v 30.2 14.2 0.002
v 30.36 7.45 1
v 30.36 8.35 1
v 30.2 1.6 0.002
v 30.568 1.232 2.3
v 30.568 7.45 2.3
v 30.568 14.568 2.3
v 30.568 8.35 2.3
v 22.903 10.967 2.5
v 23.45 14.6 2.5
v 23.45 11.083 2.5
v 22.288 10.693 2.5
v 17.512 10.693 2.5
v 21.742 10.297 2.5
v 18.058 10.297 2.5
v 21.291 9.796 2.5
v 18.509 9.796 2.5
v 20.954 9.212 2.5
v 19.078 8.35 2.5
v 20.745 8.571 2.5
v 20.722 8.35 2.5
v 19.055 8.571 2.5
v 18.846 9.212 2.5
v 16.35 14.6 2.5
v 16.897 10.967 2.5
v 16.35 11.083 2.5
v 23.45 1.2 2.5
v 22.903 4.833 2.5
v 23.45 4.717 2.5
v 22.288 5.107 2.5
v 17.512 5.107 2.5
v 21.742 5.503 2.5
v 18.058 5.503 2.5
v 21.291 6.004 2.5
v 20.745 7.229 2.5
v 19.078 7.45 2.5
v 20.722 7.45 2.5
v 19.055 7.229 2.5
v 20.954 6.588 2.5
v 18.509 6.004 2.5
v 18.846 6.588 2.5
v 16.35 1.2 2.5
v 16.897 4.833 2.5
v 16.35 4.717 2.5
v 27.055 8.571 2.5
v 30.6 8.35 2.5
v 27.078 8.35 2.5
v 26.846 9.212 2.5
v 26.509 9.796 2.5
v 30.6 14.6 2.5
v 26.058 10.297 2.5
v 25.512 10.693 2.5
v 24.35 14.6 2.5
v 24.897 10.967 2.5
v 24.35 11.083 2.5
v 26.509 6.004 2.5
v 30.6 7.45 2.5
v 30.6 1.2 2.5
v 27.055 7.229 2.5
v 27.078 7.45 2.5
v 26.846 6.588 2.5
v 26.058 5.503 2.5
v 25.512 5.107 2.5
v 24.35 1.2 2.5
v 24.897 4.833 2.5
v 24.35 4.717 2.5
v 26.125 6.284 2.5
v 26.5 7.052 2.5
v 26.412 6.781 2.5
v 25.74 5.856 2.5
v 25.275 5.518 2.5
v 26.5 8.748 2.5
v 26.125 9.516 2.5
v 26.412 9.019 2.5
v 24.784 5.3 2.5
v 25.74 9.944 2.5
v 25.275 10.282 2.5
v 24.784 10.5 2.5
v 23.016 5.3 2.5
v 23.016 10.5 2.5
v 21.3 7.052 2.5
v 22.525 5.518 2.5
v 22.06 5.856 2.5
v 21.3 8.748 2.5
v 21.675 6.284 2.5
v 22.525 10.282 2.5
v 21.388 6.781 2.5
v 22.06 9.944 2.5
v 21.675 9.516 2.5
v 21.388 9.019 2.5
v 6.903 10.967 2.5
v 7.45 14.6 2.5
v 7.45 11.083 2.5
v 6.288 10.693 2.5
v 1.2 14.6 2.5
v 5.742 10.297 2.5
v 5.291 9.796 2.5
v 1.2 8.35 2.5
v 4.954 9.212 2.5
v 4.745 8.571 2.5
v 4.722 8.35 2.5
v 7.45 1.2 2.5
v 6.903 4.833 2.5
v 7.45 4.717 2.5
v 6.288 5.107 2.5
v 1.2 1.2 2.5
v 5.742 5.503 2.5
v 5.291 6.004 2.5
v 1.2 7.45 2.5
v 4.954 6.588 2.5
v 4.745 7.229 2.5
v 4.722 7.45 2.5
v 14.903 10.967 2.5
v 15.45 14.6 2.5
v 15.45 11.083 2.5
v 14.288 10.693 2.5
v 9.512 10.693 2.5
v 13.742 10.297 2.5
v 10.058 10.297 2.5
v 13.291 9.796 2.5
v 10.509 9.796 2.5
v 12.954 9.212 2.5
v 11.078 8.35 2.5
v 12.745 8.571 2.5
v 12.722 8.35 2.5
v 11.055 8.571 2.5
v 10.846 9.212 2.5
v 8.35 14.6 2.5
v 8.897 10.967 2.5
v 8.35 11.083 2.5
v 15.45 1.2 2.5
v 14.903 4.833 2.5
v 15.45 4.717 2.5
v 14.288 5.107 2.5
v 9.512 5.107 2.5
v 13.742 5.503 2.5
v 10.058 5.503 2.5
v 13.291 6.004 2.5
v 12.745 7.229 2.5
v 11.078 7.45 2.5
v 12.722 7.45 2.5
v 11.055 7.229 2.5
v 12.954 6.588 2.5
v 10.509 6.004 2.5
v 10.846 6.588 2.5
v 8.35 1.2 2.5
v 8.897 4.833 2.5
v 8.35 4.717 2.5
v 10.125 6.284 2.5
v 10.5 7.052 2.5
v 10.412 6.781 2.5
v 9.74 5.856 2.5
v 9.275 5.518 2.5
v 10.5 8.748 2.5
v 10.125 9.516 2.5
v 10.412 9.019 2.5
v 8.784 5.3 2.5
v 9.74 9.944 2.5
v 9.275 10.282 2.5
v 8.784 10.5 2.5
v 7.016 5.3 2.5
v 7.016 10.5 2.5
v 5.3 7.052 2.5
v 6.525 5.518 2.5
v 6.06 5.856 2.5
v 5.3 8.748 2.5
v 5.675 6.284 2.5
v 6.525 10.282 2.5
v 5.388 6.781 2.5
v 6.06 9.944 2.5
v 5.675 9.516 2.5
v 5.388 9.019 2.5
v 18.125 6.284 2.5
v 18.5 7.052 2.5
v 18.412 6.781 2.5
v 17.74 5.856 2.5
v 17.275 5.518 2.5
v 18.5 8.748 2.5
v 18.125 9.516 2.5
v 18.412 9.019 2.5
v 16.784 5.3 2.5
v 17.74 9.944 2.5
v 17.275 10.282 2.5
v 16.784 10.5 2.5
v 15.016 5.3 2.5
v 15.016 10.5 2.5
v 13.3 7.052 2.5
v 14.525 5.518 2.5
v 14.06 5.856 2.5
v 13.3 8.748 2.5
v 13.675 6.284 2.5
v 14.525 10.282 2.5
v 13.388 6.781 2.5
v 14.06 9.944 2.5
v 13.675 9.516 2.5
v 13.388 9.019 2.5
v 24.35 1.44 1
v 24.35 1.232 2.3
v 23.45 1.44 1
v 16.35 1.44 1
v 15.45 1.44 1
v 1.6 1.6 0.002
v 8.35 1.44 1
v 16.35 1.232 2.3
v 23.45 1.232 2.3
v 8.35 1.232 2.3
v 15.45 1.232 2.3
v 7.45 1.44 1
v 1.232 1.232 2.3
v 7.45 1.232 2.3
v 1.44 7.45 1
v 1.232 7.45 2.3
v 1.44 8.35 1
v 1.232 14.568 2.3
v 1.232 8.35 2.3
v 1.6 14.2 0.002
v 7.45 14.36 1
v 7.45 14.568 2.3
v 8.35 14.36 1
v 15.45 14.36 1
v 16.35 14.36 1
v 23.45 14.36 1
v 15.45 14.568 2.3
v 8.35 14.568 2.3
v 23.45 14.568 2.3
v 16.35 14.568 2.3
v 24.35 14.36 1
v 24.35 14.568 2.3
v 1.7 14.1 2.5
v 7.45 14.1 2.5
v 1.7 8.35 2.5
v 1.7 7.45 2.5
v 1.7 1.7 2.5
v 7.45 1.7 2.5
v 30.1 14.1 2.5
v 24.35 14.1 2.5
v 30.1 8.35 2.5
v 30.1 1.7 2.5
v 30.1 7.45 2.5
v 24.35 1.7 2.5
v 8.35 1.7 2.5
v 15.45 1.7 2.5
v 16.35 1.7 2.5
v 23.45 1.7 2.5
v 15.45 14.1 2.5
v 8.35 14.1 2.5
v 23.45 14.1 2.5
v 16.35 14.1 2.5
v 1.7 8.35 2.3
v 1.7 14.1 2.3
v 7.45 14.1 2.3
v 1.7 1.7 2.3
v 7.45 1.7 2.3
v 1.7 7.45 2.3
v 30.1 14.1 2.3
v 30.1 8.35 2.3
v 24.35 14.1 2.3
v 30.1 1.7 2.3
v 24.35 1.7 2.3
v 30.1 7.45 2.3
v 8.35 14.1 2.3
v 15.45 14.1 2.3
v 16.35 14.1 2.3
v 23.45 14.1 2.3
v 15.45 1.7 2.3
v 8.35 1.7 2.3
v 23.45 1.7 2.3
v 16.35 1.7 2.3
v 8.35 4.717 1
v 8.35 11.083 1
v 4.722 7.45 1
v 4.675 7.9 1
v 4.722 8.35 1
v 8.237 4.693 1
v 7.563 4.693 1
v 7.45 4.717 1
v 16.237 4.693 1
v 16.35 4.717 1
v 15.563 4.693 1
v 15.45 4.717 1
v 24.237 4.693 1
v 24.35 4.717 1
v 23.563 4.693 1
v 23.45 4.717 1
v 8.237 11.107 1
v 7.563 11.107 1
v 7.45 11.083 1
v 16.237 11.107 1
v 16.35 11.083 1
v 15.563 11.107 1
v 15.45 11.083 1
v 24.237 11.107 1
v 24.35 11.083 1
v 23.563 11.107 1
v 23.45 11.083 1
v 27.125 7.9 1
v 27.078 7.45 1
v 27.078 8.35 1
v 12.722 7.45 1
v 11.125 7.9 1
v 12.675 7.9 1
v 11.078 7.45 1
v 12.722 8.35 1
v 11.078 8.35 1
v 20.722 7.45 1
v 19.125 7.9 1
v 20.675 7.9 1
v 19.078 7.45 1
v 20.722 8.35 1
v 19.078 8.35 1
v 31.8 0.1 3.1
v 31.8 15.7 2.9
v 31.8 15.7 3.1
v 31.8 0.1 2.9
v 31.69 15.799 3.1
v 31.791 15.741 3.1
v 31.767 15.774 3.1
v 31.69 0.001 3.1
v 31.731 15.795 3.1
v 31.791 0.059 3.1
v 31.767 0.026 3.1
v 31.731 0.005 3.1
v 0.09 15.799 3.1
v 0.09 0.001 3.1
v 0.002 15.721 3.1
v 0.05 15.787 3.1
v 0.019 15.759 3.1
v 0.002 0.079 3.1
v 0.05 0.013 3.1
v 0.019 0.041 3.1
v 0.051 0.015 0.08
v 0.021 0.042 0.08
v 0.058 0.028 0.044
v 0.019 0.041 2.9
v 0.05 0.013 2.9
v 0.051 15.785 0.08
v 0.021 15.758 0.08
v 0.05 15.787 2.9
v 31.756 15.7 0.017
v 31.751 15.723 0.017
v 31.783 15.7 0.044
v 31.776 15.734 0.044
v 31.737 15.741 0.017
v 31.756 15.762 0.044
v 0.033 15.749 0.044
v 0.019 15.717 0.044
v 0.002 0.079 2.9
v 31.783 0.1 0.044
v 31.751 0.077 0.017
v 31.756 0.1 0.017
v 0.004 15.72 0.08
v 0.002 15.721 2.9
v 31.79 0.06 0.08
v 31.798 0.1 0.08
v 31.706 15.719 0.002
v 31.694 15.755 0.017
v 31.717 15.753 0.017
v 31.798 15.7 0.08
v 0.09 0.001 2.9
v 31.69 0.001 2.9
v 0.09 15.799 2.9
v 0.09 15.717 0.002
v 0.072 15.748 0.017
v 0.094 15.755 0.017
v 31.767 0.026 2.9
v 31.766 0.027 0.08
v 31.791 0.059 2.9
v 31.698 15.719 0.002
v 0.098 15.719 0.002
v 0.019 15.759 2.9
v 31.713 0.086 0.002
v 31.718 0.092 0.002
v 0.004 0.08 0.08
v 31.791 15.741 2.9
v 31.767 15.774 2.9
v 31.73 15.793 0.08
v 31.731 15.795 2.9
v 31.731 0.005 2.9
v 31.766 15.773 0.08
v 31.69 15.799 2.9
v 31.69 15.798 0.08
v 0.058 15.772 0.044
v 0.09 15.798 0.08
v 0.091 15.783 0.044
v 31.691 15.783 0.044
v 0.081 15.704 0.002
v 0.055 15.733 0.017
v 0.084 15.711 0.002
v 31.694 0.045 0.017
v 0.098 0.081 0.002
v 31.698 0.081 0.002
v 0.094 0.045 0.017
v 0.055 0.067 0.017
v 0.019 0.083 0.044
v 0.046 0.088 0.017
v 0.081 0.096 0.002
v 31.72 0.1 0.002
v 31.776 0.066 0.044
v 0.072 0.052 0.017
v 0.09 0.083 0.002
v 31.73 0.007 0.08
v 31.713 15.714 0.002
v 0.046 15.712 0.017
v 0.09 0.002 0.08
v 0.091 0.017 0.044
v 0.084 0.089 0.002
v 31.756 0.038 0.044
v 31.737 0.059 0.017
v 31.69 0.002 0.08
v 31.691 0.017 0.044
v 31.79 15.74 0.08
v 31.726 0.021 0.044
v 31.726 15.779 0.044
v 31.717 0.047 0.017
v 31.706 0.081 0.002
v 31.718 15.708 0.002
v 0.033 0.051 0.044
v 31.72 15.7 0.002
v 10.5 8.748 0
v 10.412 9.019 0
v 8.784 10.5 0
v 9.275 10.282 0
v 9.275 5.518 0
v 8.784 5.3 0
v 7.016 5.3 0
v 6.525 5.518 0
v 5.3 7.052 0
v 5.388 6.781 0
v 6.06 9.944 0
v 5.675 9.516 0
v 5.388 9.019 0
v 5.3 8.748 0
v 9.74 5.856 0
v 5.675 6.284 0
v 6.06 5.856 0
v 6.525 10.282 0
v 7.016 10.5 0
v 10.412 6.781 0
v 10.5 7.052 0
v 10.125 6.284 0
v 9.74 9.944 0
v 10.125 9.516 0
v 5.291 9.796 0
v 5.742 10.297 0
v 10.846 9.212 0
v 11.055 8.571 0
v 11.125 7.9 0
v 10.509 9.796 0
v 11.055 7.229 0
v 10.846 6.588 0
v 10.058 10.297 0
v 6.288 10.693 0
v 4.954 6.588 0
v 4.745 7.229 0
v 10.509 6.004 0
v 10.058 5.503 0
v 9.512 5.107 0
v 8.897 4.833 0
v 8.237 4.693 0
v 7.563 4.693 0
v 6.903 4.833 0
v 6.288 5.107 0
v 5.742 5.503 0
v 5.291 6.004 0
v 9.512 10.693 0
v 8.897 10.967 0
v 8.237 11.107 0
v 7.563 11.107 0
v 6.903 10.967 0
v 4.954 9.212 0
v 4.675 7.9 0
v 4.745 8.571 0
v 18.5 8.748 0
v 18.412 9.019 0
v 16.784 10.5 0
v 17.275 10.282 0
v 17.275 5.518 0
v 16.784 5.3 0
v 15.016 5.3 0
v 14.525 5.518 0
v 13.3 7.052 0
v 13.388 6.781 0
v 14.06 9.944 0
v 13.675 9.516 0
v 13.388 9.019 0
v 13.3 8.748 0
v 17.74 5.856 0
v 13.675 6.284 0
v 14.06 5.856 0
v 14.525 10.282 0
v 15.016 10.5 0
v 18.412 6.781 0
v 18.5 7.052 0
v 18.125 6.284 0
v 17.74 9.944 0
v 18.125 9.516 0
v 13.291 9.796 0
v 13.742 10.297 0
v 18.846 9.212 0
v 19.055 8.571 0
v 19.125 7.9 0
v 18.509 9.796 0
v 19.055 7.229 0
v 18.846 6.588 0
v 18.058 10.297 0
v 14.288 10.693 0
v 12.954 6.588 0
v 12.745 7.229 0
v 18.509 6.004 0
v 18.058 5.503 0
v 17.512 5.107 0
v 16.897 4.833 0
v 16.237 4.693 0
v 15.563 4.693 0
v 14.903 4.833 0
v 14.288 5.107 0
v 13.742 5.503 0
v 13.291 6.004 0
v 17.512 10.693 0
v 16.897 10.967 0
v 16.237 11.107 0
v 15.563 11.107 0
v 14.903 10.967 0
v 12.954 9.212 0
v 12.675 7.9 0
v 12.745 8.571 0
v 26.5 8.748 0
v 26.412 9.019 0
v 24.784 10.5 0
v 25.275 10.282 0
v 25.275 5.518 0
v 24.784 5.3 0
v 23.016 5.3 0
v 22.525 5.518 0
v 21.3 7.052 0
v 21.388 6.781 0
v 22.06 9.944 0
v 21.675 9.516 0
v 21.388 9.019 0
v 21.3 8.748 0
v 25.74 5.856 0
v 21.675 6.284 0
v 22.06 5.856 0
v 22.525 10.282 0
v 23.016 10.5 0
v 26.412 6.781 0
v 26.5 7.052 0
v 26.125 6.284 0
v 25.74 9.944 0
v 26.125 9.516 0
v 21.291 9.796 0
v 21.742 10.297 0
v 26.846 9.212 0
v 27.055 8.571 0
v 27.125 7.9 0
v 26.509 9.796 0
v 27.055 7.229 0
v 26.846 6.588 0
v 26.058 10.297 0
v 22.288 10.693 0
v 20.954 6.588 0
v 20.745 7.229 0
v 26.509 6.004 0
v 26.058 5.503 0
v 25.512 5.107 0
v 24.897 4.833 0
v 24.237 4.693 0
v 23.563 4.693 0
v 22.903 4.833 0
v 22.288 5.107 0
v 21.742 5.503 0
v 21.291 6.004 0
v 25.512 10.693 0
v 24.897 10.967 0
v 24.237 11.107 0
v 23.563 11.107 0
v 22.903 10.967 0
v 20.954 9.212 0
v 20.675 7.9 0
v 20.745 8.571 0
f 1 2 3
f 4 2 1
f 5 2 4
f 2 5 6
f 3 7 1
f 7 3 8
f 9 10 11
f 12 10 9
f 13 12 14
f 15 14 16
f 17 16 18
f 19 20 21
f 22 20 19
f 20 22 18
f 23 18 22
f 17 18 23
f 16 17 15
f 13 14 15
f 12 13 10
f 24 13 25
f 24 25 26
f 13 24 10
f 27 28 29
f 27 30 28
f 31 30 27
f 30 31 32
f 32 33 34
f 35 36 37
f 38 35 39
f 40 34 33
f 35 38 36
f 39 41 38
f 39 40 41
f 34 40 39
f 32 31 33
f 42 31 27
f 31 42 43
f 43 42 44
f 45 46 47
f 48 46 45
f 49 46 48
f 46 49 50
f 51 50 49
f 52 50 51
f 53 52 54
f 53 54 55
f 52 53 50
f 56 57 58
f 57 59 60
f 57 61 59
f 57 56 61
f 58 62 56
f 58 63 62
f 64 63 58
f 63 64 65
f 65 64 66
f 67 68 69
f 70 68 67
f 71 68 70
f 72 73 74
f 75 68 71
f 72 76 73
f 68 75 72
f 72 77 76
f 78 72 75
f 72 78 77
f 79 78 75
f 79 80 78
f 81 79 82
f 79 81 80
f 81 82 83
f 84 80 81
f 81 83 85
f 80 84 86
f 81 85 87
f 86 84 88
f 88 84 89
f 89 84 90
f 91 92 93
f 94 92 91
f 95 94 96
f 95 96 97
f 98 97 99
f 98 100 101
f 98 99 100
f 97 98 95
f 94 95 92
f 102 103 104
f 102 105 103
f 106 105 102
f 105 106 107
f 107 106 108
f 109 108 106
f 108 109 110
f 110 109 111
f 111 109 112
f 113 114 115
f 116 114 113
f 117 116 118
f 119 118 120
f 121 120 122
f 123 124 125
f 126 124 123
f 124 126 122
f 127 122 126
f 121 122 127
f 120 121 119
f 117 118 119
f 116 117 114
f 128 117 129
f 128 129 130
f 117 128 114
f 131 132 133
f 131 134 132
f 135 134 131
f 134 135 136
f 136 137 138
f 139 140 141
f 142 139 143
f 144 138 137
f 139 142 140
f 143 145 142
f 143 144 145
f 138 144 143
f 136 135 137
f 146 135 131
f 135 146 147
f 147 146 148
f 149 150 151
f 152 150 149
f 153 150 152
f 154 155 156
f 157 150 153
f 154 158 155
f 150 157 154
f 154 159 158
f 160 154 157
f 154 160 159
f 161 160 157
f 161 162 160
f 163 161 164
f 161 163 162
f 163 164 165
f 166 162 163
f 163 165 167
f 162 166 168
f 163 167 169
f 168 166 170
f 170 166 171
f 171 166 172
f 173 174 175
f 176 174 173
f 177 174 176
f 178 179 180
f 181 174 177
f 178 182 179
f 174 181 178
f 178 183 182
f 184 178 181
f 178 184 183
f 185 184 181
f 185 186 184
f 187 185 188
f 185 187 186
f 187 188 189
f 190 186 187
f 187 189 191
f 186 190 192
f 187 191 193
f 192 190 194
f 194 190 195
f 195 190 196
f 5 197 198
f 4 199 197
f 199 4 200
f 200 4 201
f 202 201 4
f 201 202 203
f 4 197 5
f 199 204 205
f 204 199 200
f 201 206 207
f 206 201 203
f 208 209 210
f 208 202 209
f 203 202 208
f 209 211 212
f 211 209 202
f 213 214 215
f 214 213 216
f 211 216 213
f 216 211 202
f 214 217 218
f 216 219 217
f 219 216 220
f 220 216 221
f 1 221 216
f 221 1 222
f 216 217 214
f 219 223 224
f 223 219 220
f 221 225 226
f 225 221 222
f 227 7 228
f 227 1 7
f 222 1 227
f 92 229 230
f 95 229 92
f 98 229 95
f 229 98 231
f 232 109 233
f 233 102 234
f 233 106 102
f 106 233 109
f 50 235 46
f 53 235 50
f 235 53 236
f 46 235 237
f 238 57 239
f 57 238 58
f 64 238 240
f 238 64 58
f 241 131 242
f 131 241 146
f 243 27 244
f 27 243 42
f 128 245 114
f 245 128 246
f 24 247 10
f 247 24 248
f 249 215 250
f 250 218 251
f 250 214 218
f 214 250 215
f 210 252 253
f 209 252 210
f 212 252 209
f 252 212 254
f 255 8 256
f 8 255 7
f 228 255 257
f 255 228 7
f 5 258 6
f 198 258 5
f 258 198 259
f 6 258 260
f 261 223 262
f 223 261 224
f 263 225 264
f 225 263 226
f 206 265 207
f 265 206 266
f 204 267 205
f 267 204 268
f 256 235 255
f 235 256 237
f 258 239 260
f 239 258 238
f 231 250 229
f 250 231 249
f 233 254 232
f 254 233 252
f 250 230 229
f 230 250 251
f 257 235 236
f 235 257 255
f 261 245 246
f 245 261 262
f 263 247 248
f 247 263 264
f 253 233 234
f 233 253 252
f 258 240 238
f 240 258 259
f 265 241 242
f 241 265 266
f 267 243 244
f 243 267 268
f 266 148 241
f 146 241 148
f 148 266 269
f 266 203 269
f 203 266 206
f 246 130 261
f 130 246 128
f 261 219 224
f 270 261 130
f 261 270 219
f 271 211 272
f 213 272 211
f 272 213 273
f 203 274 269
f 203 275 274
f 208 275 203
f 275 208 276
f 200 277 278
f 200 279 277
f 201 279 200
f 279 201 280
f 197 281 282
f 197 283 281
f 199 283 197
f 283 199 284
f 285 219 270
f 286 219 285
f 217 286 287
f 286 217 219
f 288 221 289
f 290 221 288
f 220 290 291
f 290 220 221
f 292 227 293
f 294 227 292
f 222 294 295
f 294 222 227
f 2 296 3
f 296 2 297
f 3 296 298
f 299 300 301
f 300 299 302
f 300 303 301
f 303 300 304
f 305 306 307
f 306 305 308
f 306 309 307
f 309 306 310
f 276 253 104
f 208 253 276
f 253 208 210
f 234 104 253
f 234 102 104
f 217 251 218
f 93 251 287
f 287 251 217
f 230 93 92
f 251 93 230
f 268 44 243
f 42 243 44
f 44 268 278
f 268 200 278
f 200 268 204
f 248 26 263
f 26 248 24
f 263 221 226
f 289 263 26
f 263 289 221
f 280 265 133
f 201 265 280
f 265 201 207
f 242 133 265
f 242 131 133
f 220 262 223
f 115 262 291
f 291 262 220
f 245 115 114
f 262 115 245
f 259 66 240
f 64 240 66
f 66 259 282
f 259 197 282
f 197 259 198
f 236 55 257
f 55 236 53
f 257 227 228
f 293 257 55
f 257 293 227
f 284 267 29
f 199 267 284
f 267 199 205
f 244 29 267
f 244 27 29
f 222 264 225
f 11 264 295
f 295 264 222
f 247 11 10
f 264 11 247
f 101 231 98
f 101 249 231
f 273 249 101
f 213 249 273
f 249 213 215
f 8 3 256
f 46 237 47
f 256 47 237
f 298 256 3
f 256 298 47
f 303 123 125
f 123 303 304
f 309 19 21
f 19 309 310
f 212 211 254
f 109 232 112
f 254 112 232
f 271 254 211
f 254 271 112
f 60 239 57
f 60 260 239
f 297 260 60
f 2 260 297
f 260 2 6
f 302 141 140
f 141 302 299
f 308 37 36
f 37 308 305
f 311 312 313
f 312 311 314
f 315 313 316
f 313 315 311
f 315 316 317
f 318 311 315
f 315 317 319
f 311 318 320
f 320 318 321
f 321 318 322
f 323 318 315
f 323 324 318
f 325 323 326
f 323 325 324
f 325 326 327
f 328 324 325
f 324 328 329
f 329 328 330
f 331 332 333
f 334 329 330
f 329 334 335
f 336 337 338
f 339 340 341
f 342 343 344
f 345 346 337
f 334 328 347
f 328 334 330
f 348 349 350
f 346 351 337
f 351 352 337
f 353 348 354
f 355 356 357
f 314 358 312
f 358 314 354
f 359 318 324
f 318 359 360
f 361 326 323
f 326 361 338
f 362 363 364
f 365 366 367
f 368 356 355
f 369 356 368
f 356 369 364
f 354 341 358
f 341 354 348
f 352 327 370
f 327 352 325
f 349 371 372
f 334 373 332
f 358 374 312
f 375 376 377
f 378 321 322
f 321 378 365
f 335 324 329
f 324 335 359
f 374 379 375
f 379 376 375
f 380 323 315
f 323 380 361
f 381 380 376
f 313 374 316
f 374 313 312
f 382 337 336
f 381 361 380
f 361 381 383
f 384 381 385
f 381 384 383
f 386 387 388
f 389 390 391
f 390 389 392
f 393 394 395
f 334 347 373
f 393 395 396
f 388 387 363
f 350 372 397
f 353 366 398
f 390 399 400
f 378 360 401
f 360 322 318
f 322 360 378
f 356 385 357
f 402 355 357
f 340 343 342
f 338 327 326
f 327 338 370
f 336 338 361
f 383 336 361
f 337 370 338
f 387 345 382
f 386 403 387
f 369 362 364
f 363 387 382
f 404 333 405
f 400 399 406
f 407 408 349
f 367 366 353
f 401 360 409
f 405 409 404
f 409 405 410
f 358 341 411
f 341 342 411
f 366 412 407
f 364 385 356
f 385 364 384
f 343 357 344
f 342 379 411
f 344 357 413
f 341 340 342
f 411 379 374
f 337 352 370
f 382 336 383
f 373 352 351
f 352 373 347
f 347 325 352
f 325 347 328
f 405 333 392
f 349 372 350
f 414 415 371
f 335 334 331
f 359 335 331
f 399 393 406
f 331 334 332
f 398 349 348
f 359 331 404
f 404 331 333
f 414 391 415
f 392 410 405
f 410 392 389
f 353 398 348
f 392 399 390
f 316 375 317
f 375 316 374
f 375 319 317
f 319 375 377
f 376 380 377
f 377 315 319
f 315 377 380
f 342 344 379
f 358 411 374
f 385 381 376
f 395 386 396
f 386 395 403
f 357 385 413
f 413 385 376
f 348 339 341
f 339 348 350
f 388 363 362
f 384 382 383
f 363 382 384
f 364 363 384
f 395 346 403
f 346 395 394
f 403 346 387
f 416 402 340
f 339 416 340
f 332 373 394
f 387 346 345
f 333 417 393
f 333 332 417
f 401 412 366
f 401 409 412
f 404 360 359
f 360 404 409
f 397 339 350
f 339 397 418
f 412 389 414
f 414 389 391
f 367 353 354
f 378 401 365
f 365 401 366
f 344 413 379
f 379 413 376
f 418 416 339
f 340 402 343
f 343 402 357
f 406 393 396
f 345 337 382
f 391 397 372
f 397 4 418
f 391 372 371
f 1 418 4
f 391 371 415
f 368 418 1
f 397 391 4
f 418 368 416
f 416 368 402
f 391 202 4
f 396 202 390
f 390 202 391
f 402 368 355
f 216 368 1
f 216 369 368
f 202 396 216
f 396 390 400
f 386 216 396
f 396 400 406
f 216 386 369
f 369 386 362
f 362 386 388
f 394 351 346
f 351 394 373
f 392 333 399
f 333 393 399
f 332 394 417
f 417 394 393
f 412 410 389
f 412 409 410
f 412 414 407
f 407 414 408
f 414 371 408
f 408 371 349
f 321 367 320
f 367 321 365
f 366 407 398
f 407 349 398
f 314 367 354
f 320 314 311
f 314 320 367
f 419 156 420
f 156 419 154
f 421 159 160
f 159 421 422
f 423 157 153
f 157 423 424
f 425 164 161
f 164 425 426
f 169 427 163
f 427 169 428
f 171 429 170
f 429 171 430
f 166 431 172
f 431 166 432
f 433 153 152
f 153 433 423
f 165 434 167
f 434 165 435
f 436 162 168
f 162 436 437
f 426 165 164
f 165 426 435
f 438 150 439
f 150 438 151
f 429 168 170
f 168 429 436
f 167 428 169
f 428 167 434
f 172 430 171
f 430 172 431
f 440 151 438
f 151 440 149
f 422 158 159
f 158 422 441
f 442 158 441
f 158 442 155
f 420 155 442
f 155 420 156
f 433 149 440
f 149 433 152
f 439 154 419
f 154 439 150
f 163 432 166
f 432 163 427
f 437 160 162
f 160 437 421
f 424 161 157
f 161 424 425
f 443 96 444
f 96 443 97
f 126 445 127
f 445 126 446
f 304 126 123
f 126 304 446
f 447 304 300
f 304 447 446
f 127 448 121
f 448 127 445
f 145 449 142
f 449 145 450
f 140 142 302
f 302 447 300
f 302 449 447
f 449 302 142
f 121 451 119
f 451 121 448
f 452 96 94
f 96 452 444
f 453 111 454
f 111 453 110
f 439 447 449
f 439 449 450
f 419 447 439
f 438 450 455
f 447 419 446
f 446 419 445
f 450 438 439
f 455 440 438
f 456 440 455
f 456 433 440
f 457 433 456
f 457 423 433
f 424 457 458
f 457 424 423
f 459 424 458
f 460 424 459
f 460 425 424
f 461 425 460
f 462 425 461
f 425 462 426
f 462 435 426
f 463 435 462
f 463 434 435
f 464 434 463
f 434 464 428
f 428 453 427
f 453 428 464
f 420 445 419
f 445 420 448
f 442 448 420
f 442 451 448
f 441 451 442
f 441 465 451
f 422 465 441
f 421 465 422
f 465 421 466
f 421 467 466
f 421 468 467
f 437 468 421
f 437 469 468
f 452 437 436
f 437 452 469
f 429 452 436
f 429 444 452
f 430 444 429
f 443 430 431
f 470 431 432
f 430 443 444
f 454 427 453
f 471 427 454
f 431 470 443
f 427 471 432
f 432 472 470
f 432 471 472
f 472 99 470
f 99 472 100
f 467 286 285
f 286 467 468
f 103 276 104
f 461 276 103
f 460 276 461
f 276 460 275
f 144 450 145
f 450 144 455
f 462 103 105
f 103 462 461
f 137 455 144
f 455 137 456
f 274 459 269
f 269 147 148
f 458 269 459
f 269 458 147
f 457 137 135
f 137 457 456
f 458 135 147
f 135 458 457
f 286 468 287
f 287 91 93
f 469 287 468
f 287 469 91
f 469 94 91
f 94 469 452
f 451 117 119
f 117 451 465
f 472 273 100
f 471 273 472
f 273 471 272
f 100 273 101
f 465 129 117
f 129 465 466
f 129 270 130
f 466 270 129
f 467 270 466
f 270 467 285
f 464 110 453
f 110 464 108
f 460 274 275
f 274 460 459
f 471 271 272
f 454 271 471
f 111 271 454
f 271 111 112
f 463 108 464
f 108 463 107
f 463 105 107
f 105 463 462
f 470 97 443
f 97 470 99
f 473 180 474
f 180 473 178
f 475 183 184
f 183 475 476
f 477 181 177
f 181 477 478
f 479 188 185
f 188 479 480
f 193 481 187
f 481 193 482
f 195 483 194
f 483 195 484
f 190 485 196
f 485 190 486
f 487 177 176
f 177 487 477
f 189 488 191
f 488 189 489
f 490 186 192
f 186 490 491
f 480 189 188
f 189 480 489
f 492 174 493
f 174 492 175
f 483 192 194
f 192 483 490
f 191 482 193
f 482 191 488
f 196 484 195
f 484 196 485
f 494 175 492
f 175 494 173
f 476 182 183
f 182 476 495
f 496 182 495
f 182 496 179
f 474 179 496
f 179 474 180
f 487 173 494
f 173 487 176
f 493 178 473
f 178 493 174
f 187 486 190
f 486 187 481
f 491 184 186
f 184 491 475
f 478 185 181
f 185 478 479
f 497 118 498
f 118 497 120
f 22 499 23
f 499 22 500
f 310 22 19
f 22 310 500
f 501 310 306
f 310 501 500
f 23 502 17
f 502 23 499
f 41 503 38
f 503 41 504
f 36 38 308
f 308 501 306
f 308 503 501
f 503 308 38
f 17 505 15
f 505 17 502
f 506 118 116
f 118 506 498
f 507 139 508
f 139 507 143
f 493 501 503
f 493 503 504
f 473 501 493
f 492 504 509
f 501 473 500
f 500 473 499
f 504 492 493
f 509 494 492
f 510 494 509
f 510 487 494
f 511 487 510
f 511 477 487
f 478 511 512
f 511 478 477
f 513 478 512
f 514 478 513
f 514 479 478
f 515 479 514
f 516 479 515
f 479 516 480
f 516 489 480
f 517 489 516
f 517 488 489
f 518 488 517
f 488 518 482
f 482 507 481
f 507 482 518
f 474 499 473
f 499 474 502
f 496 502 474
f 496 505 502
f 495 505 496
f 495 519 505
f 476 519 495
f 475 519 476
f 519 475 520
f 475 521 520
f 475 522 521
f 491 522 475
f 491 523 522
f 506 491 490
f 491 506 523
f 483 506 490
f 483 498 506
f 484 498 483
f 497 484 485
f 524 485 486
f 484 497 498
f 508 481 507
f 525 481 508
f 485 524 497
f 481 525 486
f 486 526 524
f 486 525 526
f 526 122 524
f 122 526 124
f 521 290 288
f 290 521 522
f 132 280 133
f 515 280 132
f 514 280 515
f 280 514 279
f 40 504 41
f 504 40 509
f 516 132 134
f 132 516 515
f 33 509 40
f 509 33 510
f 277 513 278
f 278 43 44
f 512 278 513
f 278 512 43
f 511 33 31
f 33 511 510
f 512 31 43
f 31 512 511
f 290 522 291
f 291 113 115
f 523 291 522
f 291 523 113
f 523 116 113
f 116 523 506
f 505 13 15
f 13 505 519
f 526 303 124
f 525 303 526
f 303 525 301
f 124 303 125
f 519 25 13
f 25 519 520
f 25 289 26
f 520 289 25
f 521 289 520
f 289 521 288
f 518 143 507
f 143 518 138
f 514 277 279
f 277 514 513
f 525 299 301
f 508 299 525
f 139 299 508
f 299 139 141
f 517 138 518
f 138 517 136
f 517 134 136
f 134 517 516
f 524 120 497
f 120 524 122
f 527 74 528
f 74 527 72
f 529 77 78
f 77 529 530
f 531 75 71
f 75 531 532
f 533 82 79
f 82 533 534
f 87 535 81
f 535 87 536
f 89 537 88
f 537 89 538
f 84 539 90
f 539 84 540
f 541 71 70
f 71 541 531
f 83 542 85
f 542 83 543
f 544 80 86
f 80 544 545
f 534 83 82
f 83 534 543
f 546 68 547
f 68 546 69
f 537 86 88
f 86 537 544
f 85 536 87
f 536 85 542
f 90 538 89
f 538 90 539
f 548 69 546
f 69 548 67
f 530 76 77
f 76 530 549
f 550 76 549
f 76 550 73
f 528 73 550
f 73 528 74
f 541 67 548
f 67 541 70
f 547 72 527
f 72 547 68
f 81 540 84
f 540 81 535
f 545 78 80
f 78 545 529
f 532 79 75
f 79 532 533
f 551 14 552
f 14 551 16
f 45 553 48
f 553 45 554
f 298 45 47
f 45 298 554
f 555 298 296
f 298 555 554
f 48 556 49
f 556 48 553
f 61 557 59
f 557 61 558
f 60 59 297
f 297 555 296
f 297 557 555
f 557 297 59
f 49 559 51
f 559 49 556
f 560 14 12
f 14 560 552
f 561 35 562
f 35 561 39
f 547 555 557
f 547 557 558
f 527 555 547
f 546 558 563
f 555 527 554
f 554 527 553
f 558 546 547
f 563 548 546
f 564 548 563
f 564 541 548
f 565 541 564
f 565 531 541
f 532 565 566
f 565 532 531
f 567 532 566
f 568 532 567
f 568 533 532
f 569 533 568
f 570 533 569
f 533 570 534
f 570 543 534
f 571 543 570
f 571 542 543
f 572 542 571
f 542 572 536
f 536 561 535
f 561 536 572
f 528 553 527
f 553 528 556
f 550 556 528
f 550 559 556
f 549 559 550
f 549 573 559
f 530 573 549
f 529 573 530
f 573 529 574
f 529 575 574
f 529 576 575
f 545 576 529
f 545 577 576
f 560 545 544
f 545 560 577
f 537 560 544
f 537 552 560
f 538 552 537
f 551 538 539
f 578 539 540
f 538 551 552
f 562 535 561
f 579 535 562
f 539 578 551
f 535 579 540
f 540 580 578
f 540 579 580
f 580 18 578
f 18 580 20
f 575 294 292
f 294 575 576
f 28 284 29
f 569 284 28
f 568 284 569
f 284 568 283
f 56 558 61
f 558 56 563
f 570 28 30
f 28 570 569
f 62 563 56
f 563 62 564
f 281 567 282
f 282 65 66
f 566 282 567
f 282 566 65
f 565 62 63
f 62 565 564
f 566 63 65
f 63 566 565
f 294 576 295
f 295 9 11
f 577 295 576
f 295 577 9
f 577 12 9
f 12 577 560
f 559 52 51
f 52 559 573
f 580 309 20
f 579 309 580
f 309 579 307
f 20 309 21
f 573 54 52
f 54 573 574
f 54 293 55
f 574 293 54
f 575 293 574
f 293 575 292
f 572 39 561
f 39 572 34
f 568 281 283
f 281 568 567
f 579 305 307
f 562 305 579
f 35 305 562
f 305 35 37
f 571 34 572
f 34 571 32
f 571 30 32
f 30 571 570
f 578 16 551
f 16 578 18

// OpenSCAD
// file: ../../lib/brick-hollow.scad
/**
* Machine Blocks
* https://machinemania.net/blocks 
*
* Brick Hollow
* Copyright (c) 2022 Jan Philipp Knoeller <pk@pksoftware.de>
*
* Published under license:
* Creative Commons Attribution-NonCommercial-ShareAlike 4.0 International 
* https://creativecommons.org/licenses/by-nc-sa/4.0/
*
*/
echo(version=version());

module brickHollow(height=9.3, fade=2.5, minSize=[4.6,4.6], maxSize=[5.2, 5.2], center = false){
    echo(height, minSize, maxSize, fade);
    sizeX = max(minSize[0],maxSize[0]); 
   sizeY = max(minSize[1],maxSize[1]); 
    
    posX = center ? 0 : 0.5*sizeX; 
   posY = center ? 0 : 0.5*sizeY;   
   posZ = center ? -0.5 * (height-fade) : 0.5*fade;
    
    cutHelper = 0.2;
    overlapSpace=0.1;
    
    translate([posX, posY, posZ]){
        union(){
            polyhedron(points=[
                [-0.5*minSize[0],-0.5*minSize[1],-0.5*fade],
                [0.5*minSize[0],-0.5*minSize[1],-0.5*fade],
                [0.5*minSize[0],0.5*minSize[1],-0.5*fade],
                [-0.5*minSize[0],0.5*minSize[1],-0.5*fade],
                [-0.5*maxSize[0],-0.5*maxSize[1],0.5*fade],
                [0.5*maxSize[0],-0.5*maxSize[1],0.5*fade],
                [0.5*maxSize[0],0.5*maxSize[1],0.5*fade],
                [-0.5*maxSize[0],0.5*maxSize[1],0.5*fade]
            ], faces=[[0,1,2,3],[1,0,4,5],[2,1,5,6],[3,2,6,7],[0,3,7,4],[7,6,5,4]]);
            
            if(height > fade){
                translate([0,0,0.5*height - overlapSpace]){
                    cube([maxSize[0], maxSize[1], height - fade + overlapSpace], center=true);
                }
            }
            
            translate([0,0,-0.5*(fade + cutHelper) + overlapSpace]){
                cube([minSize[0], minSize[1], cutHelper + overlapSpace], center=true);
            }
        }
    }
}

//brickHollow(height=9.3, maxSize=[5.2,5.2], minSize=[4.6,4.6], center=true);
// file: ../../lib/roundedcube_simple.scad
/**
* Machine Blocks
* https://machinemania.net/blocks 
*
* Module for simple rounded cubes
* Copyright (c) 2022 Jan Philipp Knoeller <pk@pksoftware.de>
*
* Published under license:
* Creative Commons Attribution-NonCommercial-ShareAlike 4.0 International 
* https://creativecommons.org/licenses/by-nc-sa/4.0/
*
*/
module roundedcube_simple(size = [1, 1, 1], center = false, radius = 0.5, resolution = 20) {
	// If single value, convert to [x, y, z] vector
	size = (size[0] == undef) ? [size, size, size] : size;

	translate = (center == false) ?
		[radius, radius, radius] :
		[
			radius - (size[0] / 2),
			radius - (size[1] / 2),
			radius - (size[2] / 2)
	];

	translate(v = translate)
	minkowski() {
		cube(size = [
			size[0] - (radius * 2),
			size[1] - (radius * 2),
			size[2] - (radius * 2)
		]);
		sphere(r = radius, $fn = resolution);
	}
}
// file: ../../lib/roundedcube.scad
// More information: https://danielupshaw.com/openscad-rounded-corners/

// Set to 0.01 for higher definition curves (renders slower)
$fs = 0.15;

module roundedcube(size = [1, 1, 1], center = false, radius = 0.5, apply_to = "all", resolution = 20) {
	// If single value, convert to [x, y, z] vector
	size = (size[0] == undef) ? [size, size, size] : size;

	translate_min = radius;
	translate_xmax = size[0] - radius;
	translate_ymax = size[1] - radius;
	translate_zmax = size[2] - radius;

	diameter = radius * 2;

	obj_translate = (center == false) ?
		[0, 0, 0] : [
			-(size[0] / 2),
			-(size[1] / 2),
			-(size[2] / 2)
		];

	translate(v = obj_translate) {
		hull() {
			for (translate_x = [translate_min, translate_xmax]) {
				x_at = (translate_x == translate_min) ? "min" : "max";
				for (translate_y = [translate_min, translate_ymax]) {
					y_at = (translate_y == translate_min) ? "min" : "max";
					for (translate_z = [translate_min, translate_zmax]) {
						z_at = (translate_z == translate_min) ? "min" : "max";

						translate(v = [translate_x, translate_y, translate_z])
						if (
							(apply_to == "all") ||
							(apply_to == "xmin" && x_at == "min") || (apply_to == "xmax" && x_at == "max") ||
							(apply_to == "ymin" && y_at == "min") || (apply_to == "ymax" && y_at == "max") ||
							(apply_to == "zmin" && z_at == "min") || (apply_to == "zmax" && z_at == "max")
						) {
							sphere(r = radius, $fn = resolution);
						} else {
							rotate = 
								(apply_to == "xmin" || apply_to == "xmax" || apply_to == "x") ? [0, 90, 0] : (
								(apply_to == "ymin" || apply_to == "ymax" || apply_to == "y") ? [90, 90, 0] :
								[0, 0, 0]
							);
							rotate(a = rotate)
							cylinder(h = diameter, r = radius, center = true, $fn = resolution);
						}
					}
				}
			}
		}
	}
}
// main file
/**
* Machine Blocks
* https://machinemania.net/blocks 
*
* Plate 4x2 without knobs
* Copyright (c) 2022 Jan Philipp Knoeller <pk@pksoftware.de>
*
* Published under license:
* Creative Commons Attribution-NonCommercial-ShareAlike 4.0 International 
* https://creativecommons.org/licenses/by-nc-sa/4.0/
*
*/
echo(version=version());

include <../../lib/block-v2.scad>;

block(grid=[4,2], withKnobs=false);
